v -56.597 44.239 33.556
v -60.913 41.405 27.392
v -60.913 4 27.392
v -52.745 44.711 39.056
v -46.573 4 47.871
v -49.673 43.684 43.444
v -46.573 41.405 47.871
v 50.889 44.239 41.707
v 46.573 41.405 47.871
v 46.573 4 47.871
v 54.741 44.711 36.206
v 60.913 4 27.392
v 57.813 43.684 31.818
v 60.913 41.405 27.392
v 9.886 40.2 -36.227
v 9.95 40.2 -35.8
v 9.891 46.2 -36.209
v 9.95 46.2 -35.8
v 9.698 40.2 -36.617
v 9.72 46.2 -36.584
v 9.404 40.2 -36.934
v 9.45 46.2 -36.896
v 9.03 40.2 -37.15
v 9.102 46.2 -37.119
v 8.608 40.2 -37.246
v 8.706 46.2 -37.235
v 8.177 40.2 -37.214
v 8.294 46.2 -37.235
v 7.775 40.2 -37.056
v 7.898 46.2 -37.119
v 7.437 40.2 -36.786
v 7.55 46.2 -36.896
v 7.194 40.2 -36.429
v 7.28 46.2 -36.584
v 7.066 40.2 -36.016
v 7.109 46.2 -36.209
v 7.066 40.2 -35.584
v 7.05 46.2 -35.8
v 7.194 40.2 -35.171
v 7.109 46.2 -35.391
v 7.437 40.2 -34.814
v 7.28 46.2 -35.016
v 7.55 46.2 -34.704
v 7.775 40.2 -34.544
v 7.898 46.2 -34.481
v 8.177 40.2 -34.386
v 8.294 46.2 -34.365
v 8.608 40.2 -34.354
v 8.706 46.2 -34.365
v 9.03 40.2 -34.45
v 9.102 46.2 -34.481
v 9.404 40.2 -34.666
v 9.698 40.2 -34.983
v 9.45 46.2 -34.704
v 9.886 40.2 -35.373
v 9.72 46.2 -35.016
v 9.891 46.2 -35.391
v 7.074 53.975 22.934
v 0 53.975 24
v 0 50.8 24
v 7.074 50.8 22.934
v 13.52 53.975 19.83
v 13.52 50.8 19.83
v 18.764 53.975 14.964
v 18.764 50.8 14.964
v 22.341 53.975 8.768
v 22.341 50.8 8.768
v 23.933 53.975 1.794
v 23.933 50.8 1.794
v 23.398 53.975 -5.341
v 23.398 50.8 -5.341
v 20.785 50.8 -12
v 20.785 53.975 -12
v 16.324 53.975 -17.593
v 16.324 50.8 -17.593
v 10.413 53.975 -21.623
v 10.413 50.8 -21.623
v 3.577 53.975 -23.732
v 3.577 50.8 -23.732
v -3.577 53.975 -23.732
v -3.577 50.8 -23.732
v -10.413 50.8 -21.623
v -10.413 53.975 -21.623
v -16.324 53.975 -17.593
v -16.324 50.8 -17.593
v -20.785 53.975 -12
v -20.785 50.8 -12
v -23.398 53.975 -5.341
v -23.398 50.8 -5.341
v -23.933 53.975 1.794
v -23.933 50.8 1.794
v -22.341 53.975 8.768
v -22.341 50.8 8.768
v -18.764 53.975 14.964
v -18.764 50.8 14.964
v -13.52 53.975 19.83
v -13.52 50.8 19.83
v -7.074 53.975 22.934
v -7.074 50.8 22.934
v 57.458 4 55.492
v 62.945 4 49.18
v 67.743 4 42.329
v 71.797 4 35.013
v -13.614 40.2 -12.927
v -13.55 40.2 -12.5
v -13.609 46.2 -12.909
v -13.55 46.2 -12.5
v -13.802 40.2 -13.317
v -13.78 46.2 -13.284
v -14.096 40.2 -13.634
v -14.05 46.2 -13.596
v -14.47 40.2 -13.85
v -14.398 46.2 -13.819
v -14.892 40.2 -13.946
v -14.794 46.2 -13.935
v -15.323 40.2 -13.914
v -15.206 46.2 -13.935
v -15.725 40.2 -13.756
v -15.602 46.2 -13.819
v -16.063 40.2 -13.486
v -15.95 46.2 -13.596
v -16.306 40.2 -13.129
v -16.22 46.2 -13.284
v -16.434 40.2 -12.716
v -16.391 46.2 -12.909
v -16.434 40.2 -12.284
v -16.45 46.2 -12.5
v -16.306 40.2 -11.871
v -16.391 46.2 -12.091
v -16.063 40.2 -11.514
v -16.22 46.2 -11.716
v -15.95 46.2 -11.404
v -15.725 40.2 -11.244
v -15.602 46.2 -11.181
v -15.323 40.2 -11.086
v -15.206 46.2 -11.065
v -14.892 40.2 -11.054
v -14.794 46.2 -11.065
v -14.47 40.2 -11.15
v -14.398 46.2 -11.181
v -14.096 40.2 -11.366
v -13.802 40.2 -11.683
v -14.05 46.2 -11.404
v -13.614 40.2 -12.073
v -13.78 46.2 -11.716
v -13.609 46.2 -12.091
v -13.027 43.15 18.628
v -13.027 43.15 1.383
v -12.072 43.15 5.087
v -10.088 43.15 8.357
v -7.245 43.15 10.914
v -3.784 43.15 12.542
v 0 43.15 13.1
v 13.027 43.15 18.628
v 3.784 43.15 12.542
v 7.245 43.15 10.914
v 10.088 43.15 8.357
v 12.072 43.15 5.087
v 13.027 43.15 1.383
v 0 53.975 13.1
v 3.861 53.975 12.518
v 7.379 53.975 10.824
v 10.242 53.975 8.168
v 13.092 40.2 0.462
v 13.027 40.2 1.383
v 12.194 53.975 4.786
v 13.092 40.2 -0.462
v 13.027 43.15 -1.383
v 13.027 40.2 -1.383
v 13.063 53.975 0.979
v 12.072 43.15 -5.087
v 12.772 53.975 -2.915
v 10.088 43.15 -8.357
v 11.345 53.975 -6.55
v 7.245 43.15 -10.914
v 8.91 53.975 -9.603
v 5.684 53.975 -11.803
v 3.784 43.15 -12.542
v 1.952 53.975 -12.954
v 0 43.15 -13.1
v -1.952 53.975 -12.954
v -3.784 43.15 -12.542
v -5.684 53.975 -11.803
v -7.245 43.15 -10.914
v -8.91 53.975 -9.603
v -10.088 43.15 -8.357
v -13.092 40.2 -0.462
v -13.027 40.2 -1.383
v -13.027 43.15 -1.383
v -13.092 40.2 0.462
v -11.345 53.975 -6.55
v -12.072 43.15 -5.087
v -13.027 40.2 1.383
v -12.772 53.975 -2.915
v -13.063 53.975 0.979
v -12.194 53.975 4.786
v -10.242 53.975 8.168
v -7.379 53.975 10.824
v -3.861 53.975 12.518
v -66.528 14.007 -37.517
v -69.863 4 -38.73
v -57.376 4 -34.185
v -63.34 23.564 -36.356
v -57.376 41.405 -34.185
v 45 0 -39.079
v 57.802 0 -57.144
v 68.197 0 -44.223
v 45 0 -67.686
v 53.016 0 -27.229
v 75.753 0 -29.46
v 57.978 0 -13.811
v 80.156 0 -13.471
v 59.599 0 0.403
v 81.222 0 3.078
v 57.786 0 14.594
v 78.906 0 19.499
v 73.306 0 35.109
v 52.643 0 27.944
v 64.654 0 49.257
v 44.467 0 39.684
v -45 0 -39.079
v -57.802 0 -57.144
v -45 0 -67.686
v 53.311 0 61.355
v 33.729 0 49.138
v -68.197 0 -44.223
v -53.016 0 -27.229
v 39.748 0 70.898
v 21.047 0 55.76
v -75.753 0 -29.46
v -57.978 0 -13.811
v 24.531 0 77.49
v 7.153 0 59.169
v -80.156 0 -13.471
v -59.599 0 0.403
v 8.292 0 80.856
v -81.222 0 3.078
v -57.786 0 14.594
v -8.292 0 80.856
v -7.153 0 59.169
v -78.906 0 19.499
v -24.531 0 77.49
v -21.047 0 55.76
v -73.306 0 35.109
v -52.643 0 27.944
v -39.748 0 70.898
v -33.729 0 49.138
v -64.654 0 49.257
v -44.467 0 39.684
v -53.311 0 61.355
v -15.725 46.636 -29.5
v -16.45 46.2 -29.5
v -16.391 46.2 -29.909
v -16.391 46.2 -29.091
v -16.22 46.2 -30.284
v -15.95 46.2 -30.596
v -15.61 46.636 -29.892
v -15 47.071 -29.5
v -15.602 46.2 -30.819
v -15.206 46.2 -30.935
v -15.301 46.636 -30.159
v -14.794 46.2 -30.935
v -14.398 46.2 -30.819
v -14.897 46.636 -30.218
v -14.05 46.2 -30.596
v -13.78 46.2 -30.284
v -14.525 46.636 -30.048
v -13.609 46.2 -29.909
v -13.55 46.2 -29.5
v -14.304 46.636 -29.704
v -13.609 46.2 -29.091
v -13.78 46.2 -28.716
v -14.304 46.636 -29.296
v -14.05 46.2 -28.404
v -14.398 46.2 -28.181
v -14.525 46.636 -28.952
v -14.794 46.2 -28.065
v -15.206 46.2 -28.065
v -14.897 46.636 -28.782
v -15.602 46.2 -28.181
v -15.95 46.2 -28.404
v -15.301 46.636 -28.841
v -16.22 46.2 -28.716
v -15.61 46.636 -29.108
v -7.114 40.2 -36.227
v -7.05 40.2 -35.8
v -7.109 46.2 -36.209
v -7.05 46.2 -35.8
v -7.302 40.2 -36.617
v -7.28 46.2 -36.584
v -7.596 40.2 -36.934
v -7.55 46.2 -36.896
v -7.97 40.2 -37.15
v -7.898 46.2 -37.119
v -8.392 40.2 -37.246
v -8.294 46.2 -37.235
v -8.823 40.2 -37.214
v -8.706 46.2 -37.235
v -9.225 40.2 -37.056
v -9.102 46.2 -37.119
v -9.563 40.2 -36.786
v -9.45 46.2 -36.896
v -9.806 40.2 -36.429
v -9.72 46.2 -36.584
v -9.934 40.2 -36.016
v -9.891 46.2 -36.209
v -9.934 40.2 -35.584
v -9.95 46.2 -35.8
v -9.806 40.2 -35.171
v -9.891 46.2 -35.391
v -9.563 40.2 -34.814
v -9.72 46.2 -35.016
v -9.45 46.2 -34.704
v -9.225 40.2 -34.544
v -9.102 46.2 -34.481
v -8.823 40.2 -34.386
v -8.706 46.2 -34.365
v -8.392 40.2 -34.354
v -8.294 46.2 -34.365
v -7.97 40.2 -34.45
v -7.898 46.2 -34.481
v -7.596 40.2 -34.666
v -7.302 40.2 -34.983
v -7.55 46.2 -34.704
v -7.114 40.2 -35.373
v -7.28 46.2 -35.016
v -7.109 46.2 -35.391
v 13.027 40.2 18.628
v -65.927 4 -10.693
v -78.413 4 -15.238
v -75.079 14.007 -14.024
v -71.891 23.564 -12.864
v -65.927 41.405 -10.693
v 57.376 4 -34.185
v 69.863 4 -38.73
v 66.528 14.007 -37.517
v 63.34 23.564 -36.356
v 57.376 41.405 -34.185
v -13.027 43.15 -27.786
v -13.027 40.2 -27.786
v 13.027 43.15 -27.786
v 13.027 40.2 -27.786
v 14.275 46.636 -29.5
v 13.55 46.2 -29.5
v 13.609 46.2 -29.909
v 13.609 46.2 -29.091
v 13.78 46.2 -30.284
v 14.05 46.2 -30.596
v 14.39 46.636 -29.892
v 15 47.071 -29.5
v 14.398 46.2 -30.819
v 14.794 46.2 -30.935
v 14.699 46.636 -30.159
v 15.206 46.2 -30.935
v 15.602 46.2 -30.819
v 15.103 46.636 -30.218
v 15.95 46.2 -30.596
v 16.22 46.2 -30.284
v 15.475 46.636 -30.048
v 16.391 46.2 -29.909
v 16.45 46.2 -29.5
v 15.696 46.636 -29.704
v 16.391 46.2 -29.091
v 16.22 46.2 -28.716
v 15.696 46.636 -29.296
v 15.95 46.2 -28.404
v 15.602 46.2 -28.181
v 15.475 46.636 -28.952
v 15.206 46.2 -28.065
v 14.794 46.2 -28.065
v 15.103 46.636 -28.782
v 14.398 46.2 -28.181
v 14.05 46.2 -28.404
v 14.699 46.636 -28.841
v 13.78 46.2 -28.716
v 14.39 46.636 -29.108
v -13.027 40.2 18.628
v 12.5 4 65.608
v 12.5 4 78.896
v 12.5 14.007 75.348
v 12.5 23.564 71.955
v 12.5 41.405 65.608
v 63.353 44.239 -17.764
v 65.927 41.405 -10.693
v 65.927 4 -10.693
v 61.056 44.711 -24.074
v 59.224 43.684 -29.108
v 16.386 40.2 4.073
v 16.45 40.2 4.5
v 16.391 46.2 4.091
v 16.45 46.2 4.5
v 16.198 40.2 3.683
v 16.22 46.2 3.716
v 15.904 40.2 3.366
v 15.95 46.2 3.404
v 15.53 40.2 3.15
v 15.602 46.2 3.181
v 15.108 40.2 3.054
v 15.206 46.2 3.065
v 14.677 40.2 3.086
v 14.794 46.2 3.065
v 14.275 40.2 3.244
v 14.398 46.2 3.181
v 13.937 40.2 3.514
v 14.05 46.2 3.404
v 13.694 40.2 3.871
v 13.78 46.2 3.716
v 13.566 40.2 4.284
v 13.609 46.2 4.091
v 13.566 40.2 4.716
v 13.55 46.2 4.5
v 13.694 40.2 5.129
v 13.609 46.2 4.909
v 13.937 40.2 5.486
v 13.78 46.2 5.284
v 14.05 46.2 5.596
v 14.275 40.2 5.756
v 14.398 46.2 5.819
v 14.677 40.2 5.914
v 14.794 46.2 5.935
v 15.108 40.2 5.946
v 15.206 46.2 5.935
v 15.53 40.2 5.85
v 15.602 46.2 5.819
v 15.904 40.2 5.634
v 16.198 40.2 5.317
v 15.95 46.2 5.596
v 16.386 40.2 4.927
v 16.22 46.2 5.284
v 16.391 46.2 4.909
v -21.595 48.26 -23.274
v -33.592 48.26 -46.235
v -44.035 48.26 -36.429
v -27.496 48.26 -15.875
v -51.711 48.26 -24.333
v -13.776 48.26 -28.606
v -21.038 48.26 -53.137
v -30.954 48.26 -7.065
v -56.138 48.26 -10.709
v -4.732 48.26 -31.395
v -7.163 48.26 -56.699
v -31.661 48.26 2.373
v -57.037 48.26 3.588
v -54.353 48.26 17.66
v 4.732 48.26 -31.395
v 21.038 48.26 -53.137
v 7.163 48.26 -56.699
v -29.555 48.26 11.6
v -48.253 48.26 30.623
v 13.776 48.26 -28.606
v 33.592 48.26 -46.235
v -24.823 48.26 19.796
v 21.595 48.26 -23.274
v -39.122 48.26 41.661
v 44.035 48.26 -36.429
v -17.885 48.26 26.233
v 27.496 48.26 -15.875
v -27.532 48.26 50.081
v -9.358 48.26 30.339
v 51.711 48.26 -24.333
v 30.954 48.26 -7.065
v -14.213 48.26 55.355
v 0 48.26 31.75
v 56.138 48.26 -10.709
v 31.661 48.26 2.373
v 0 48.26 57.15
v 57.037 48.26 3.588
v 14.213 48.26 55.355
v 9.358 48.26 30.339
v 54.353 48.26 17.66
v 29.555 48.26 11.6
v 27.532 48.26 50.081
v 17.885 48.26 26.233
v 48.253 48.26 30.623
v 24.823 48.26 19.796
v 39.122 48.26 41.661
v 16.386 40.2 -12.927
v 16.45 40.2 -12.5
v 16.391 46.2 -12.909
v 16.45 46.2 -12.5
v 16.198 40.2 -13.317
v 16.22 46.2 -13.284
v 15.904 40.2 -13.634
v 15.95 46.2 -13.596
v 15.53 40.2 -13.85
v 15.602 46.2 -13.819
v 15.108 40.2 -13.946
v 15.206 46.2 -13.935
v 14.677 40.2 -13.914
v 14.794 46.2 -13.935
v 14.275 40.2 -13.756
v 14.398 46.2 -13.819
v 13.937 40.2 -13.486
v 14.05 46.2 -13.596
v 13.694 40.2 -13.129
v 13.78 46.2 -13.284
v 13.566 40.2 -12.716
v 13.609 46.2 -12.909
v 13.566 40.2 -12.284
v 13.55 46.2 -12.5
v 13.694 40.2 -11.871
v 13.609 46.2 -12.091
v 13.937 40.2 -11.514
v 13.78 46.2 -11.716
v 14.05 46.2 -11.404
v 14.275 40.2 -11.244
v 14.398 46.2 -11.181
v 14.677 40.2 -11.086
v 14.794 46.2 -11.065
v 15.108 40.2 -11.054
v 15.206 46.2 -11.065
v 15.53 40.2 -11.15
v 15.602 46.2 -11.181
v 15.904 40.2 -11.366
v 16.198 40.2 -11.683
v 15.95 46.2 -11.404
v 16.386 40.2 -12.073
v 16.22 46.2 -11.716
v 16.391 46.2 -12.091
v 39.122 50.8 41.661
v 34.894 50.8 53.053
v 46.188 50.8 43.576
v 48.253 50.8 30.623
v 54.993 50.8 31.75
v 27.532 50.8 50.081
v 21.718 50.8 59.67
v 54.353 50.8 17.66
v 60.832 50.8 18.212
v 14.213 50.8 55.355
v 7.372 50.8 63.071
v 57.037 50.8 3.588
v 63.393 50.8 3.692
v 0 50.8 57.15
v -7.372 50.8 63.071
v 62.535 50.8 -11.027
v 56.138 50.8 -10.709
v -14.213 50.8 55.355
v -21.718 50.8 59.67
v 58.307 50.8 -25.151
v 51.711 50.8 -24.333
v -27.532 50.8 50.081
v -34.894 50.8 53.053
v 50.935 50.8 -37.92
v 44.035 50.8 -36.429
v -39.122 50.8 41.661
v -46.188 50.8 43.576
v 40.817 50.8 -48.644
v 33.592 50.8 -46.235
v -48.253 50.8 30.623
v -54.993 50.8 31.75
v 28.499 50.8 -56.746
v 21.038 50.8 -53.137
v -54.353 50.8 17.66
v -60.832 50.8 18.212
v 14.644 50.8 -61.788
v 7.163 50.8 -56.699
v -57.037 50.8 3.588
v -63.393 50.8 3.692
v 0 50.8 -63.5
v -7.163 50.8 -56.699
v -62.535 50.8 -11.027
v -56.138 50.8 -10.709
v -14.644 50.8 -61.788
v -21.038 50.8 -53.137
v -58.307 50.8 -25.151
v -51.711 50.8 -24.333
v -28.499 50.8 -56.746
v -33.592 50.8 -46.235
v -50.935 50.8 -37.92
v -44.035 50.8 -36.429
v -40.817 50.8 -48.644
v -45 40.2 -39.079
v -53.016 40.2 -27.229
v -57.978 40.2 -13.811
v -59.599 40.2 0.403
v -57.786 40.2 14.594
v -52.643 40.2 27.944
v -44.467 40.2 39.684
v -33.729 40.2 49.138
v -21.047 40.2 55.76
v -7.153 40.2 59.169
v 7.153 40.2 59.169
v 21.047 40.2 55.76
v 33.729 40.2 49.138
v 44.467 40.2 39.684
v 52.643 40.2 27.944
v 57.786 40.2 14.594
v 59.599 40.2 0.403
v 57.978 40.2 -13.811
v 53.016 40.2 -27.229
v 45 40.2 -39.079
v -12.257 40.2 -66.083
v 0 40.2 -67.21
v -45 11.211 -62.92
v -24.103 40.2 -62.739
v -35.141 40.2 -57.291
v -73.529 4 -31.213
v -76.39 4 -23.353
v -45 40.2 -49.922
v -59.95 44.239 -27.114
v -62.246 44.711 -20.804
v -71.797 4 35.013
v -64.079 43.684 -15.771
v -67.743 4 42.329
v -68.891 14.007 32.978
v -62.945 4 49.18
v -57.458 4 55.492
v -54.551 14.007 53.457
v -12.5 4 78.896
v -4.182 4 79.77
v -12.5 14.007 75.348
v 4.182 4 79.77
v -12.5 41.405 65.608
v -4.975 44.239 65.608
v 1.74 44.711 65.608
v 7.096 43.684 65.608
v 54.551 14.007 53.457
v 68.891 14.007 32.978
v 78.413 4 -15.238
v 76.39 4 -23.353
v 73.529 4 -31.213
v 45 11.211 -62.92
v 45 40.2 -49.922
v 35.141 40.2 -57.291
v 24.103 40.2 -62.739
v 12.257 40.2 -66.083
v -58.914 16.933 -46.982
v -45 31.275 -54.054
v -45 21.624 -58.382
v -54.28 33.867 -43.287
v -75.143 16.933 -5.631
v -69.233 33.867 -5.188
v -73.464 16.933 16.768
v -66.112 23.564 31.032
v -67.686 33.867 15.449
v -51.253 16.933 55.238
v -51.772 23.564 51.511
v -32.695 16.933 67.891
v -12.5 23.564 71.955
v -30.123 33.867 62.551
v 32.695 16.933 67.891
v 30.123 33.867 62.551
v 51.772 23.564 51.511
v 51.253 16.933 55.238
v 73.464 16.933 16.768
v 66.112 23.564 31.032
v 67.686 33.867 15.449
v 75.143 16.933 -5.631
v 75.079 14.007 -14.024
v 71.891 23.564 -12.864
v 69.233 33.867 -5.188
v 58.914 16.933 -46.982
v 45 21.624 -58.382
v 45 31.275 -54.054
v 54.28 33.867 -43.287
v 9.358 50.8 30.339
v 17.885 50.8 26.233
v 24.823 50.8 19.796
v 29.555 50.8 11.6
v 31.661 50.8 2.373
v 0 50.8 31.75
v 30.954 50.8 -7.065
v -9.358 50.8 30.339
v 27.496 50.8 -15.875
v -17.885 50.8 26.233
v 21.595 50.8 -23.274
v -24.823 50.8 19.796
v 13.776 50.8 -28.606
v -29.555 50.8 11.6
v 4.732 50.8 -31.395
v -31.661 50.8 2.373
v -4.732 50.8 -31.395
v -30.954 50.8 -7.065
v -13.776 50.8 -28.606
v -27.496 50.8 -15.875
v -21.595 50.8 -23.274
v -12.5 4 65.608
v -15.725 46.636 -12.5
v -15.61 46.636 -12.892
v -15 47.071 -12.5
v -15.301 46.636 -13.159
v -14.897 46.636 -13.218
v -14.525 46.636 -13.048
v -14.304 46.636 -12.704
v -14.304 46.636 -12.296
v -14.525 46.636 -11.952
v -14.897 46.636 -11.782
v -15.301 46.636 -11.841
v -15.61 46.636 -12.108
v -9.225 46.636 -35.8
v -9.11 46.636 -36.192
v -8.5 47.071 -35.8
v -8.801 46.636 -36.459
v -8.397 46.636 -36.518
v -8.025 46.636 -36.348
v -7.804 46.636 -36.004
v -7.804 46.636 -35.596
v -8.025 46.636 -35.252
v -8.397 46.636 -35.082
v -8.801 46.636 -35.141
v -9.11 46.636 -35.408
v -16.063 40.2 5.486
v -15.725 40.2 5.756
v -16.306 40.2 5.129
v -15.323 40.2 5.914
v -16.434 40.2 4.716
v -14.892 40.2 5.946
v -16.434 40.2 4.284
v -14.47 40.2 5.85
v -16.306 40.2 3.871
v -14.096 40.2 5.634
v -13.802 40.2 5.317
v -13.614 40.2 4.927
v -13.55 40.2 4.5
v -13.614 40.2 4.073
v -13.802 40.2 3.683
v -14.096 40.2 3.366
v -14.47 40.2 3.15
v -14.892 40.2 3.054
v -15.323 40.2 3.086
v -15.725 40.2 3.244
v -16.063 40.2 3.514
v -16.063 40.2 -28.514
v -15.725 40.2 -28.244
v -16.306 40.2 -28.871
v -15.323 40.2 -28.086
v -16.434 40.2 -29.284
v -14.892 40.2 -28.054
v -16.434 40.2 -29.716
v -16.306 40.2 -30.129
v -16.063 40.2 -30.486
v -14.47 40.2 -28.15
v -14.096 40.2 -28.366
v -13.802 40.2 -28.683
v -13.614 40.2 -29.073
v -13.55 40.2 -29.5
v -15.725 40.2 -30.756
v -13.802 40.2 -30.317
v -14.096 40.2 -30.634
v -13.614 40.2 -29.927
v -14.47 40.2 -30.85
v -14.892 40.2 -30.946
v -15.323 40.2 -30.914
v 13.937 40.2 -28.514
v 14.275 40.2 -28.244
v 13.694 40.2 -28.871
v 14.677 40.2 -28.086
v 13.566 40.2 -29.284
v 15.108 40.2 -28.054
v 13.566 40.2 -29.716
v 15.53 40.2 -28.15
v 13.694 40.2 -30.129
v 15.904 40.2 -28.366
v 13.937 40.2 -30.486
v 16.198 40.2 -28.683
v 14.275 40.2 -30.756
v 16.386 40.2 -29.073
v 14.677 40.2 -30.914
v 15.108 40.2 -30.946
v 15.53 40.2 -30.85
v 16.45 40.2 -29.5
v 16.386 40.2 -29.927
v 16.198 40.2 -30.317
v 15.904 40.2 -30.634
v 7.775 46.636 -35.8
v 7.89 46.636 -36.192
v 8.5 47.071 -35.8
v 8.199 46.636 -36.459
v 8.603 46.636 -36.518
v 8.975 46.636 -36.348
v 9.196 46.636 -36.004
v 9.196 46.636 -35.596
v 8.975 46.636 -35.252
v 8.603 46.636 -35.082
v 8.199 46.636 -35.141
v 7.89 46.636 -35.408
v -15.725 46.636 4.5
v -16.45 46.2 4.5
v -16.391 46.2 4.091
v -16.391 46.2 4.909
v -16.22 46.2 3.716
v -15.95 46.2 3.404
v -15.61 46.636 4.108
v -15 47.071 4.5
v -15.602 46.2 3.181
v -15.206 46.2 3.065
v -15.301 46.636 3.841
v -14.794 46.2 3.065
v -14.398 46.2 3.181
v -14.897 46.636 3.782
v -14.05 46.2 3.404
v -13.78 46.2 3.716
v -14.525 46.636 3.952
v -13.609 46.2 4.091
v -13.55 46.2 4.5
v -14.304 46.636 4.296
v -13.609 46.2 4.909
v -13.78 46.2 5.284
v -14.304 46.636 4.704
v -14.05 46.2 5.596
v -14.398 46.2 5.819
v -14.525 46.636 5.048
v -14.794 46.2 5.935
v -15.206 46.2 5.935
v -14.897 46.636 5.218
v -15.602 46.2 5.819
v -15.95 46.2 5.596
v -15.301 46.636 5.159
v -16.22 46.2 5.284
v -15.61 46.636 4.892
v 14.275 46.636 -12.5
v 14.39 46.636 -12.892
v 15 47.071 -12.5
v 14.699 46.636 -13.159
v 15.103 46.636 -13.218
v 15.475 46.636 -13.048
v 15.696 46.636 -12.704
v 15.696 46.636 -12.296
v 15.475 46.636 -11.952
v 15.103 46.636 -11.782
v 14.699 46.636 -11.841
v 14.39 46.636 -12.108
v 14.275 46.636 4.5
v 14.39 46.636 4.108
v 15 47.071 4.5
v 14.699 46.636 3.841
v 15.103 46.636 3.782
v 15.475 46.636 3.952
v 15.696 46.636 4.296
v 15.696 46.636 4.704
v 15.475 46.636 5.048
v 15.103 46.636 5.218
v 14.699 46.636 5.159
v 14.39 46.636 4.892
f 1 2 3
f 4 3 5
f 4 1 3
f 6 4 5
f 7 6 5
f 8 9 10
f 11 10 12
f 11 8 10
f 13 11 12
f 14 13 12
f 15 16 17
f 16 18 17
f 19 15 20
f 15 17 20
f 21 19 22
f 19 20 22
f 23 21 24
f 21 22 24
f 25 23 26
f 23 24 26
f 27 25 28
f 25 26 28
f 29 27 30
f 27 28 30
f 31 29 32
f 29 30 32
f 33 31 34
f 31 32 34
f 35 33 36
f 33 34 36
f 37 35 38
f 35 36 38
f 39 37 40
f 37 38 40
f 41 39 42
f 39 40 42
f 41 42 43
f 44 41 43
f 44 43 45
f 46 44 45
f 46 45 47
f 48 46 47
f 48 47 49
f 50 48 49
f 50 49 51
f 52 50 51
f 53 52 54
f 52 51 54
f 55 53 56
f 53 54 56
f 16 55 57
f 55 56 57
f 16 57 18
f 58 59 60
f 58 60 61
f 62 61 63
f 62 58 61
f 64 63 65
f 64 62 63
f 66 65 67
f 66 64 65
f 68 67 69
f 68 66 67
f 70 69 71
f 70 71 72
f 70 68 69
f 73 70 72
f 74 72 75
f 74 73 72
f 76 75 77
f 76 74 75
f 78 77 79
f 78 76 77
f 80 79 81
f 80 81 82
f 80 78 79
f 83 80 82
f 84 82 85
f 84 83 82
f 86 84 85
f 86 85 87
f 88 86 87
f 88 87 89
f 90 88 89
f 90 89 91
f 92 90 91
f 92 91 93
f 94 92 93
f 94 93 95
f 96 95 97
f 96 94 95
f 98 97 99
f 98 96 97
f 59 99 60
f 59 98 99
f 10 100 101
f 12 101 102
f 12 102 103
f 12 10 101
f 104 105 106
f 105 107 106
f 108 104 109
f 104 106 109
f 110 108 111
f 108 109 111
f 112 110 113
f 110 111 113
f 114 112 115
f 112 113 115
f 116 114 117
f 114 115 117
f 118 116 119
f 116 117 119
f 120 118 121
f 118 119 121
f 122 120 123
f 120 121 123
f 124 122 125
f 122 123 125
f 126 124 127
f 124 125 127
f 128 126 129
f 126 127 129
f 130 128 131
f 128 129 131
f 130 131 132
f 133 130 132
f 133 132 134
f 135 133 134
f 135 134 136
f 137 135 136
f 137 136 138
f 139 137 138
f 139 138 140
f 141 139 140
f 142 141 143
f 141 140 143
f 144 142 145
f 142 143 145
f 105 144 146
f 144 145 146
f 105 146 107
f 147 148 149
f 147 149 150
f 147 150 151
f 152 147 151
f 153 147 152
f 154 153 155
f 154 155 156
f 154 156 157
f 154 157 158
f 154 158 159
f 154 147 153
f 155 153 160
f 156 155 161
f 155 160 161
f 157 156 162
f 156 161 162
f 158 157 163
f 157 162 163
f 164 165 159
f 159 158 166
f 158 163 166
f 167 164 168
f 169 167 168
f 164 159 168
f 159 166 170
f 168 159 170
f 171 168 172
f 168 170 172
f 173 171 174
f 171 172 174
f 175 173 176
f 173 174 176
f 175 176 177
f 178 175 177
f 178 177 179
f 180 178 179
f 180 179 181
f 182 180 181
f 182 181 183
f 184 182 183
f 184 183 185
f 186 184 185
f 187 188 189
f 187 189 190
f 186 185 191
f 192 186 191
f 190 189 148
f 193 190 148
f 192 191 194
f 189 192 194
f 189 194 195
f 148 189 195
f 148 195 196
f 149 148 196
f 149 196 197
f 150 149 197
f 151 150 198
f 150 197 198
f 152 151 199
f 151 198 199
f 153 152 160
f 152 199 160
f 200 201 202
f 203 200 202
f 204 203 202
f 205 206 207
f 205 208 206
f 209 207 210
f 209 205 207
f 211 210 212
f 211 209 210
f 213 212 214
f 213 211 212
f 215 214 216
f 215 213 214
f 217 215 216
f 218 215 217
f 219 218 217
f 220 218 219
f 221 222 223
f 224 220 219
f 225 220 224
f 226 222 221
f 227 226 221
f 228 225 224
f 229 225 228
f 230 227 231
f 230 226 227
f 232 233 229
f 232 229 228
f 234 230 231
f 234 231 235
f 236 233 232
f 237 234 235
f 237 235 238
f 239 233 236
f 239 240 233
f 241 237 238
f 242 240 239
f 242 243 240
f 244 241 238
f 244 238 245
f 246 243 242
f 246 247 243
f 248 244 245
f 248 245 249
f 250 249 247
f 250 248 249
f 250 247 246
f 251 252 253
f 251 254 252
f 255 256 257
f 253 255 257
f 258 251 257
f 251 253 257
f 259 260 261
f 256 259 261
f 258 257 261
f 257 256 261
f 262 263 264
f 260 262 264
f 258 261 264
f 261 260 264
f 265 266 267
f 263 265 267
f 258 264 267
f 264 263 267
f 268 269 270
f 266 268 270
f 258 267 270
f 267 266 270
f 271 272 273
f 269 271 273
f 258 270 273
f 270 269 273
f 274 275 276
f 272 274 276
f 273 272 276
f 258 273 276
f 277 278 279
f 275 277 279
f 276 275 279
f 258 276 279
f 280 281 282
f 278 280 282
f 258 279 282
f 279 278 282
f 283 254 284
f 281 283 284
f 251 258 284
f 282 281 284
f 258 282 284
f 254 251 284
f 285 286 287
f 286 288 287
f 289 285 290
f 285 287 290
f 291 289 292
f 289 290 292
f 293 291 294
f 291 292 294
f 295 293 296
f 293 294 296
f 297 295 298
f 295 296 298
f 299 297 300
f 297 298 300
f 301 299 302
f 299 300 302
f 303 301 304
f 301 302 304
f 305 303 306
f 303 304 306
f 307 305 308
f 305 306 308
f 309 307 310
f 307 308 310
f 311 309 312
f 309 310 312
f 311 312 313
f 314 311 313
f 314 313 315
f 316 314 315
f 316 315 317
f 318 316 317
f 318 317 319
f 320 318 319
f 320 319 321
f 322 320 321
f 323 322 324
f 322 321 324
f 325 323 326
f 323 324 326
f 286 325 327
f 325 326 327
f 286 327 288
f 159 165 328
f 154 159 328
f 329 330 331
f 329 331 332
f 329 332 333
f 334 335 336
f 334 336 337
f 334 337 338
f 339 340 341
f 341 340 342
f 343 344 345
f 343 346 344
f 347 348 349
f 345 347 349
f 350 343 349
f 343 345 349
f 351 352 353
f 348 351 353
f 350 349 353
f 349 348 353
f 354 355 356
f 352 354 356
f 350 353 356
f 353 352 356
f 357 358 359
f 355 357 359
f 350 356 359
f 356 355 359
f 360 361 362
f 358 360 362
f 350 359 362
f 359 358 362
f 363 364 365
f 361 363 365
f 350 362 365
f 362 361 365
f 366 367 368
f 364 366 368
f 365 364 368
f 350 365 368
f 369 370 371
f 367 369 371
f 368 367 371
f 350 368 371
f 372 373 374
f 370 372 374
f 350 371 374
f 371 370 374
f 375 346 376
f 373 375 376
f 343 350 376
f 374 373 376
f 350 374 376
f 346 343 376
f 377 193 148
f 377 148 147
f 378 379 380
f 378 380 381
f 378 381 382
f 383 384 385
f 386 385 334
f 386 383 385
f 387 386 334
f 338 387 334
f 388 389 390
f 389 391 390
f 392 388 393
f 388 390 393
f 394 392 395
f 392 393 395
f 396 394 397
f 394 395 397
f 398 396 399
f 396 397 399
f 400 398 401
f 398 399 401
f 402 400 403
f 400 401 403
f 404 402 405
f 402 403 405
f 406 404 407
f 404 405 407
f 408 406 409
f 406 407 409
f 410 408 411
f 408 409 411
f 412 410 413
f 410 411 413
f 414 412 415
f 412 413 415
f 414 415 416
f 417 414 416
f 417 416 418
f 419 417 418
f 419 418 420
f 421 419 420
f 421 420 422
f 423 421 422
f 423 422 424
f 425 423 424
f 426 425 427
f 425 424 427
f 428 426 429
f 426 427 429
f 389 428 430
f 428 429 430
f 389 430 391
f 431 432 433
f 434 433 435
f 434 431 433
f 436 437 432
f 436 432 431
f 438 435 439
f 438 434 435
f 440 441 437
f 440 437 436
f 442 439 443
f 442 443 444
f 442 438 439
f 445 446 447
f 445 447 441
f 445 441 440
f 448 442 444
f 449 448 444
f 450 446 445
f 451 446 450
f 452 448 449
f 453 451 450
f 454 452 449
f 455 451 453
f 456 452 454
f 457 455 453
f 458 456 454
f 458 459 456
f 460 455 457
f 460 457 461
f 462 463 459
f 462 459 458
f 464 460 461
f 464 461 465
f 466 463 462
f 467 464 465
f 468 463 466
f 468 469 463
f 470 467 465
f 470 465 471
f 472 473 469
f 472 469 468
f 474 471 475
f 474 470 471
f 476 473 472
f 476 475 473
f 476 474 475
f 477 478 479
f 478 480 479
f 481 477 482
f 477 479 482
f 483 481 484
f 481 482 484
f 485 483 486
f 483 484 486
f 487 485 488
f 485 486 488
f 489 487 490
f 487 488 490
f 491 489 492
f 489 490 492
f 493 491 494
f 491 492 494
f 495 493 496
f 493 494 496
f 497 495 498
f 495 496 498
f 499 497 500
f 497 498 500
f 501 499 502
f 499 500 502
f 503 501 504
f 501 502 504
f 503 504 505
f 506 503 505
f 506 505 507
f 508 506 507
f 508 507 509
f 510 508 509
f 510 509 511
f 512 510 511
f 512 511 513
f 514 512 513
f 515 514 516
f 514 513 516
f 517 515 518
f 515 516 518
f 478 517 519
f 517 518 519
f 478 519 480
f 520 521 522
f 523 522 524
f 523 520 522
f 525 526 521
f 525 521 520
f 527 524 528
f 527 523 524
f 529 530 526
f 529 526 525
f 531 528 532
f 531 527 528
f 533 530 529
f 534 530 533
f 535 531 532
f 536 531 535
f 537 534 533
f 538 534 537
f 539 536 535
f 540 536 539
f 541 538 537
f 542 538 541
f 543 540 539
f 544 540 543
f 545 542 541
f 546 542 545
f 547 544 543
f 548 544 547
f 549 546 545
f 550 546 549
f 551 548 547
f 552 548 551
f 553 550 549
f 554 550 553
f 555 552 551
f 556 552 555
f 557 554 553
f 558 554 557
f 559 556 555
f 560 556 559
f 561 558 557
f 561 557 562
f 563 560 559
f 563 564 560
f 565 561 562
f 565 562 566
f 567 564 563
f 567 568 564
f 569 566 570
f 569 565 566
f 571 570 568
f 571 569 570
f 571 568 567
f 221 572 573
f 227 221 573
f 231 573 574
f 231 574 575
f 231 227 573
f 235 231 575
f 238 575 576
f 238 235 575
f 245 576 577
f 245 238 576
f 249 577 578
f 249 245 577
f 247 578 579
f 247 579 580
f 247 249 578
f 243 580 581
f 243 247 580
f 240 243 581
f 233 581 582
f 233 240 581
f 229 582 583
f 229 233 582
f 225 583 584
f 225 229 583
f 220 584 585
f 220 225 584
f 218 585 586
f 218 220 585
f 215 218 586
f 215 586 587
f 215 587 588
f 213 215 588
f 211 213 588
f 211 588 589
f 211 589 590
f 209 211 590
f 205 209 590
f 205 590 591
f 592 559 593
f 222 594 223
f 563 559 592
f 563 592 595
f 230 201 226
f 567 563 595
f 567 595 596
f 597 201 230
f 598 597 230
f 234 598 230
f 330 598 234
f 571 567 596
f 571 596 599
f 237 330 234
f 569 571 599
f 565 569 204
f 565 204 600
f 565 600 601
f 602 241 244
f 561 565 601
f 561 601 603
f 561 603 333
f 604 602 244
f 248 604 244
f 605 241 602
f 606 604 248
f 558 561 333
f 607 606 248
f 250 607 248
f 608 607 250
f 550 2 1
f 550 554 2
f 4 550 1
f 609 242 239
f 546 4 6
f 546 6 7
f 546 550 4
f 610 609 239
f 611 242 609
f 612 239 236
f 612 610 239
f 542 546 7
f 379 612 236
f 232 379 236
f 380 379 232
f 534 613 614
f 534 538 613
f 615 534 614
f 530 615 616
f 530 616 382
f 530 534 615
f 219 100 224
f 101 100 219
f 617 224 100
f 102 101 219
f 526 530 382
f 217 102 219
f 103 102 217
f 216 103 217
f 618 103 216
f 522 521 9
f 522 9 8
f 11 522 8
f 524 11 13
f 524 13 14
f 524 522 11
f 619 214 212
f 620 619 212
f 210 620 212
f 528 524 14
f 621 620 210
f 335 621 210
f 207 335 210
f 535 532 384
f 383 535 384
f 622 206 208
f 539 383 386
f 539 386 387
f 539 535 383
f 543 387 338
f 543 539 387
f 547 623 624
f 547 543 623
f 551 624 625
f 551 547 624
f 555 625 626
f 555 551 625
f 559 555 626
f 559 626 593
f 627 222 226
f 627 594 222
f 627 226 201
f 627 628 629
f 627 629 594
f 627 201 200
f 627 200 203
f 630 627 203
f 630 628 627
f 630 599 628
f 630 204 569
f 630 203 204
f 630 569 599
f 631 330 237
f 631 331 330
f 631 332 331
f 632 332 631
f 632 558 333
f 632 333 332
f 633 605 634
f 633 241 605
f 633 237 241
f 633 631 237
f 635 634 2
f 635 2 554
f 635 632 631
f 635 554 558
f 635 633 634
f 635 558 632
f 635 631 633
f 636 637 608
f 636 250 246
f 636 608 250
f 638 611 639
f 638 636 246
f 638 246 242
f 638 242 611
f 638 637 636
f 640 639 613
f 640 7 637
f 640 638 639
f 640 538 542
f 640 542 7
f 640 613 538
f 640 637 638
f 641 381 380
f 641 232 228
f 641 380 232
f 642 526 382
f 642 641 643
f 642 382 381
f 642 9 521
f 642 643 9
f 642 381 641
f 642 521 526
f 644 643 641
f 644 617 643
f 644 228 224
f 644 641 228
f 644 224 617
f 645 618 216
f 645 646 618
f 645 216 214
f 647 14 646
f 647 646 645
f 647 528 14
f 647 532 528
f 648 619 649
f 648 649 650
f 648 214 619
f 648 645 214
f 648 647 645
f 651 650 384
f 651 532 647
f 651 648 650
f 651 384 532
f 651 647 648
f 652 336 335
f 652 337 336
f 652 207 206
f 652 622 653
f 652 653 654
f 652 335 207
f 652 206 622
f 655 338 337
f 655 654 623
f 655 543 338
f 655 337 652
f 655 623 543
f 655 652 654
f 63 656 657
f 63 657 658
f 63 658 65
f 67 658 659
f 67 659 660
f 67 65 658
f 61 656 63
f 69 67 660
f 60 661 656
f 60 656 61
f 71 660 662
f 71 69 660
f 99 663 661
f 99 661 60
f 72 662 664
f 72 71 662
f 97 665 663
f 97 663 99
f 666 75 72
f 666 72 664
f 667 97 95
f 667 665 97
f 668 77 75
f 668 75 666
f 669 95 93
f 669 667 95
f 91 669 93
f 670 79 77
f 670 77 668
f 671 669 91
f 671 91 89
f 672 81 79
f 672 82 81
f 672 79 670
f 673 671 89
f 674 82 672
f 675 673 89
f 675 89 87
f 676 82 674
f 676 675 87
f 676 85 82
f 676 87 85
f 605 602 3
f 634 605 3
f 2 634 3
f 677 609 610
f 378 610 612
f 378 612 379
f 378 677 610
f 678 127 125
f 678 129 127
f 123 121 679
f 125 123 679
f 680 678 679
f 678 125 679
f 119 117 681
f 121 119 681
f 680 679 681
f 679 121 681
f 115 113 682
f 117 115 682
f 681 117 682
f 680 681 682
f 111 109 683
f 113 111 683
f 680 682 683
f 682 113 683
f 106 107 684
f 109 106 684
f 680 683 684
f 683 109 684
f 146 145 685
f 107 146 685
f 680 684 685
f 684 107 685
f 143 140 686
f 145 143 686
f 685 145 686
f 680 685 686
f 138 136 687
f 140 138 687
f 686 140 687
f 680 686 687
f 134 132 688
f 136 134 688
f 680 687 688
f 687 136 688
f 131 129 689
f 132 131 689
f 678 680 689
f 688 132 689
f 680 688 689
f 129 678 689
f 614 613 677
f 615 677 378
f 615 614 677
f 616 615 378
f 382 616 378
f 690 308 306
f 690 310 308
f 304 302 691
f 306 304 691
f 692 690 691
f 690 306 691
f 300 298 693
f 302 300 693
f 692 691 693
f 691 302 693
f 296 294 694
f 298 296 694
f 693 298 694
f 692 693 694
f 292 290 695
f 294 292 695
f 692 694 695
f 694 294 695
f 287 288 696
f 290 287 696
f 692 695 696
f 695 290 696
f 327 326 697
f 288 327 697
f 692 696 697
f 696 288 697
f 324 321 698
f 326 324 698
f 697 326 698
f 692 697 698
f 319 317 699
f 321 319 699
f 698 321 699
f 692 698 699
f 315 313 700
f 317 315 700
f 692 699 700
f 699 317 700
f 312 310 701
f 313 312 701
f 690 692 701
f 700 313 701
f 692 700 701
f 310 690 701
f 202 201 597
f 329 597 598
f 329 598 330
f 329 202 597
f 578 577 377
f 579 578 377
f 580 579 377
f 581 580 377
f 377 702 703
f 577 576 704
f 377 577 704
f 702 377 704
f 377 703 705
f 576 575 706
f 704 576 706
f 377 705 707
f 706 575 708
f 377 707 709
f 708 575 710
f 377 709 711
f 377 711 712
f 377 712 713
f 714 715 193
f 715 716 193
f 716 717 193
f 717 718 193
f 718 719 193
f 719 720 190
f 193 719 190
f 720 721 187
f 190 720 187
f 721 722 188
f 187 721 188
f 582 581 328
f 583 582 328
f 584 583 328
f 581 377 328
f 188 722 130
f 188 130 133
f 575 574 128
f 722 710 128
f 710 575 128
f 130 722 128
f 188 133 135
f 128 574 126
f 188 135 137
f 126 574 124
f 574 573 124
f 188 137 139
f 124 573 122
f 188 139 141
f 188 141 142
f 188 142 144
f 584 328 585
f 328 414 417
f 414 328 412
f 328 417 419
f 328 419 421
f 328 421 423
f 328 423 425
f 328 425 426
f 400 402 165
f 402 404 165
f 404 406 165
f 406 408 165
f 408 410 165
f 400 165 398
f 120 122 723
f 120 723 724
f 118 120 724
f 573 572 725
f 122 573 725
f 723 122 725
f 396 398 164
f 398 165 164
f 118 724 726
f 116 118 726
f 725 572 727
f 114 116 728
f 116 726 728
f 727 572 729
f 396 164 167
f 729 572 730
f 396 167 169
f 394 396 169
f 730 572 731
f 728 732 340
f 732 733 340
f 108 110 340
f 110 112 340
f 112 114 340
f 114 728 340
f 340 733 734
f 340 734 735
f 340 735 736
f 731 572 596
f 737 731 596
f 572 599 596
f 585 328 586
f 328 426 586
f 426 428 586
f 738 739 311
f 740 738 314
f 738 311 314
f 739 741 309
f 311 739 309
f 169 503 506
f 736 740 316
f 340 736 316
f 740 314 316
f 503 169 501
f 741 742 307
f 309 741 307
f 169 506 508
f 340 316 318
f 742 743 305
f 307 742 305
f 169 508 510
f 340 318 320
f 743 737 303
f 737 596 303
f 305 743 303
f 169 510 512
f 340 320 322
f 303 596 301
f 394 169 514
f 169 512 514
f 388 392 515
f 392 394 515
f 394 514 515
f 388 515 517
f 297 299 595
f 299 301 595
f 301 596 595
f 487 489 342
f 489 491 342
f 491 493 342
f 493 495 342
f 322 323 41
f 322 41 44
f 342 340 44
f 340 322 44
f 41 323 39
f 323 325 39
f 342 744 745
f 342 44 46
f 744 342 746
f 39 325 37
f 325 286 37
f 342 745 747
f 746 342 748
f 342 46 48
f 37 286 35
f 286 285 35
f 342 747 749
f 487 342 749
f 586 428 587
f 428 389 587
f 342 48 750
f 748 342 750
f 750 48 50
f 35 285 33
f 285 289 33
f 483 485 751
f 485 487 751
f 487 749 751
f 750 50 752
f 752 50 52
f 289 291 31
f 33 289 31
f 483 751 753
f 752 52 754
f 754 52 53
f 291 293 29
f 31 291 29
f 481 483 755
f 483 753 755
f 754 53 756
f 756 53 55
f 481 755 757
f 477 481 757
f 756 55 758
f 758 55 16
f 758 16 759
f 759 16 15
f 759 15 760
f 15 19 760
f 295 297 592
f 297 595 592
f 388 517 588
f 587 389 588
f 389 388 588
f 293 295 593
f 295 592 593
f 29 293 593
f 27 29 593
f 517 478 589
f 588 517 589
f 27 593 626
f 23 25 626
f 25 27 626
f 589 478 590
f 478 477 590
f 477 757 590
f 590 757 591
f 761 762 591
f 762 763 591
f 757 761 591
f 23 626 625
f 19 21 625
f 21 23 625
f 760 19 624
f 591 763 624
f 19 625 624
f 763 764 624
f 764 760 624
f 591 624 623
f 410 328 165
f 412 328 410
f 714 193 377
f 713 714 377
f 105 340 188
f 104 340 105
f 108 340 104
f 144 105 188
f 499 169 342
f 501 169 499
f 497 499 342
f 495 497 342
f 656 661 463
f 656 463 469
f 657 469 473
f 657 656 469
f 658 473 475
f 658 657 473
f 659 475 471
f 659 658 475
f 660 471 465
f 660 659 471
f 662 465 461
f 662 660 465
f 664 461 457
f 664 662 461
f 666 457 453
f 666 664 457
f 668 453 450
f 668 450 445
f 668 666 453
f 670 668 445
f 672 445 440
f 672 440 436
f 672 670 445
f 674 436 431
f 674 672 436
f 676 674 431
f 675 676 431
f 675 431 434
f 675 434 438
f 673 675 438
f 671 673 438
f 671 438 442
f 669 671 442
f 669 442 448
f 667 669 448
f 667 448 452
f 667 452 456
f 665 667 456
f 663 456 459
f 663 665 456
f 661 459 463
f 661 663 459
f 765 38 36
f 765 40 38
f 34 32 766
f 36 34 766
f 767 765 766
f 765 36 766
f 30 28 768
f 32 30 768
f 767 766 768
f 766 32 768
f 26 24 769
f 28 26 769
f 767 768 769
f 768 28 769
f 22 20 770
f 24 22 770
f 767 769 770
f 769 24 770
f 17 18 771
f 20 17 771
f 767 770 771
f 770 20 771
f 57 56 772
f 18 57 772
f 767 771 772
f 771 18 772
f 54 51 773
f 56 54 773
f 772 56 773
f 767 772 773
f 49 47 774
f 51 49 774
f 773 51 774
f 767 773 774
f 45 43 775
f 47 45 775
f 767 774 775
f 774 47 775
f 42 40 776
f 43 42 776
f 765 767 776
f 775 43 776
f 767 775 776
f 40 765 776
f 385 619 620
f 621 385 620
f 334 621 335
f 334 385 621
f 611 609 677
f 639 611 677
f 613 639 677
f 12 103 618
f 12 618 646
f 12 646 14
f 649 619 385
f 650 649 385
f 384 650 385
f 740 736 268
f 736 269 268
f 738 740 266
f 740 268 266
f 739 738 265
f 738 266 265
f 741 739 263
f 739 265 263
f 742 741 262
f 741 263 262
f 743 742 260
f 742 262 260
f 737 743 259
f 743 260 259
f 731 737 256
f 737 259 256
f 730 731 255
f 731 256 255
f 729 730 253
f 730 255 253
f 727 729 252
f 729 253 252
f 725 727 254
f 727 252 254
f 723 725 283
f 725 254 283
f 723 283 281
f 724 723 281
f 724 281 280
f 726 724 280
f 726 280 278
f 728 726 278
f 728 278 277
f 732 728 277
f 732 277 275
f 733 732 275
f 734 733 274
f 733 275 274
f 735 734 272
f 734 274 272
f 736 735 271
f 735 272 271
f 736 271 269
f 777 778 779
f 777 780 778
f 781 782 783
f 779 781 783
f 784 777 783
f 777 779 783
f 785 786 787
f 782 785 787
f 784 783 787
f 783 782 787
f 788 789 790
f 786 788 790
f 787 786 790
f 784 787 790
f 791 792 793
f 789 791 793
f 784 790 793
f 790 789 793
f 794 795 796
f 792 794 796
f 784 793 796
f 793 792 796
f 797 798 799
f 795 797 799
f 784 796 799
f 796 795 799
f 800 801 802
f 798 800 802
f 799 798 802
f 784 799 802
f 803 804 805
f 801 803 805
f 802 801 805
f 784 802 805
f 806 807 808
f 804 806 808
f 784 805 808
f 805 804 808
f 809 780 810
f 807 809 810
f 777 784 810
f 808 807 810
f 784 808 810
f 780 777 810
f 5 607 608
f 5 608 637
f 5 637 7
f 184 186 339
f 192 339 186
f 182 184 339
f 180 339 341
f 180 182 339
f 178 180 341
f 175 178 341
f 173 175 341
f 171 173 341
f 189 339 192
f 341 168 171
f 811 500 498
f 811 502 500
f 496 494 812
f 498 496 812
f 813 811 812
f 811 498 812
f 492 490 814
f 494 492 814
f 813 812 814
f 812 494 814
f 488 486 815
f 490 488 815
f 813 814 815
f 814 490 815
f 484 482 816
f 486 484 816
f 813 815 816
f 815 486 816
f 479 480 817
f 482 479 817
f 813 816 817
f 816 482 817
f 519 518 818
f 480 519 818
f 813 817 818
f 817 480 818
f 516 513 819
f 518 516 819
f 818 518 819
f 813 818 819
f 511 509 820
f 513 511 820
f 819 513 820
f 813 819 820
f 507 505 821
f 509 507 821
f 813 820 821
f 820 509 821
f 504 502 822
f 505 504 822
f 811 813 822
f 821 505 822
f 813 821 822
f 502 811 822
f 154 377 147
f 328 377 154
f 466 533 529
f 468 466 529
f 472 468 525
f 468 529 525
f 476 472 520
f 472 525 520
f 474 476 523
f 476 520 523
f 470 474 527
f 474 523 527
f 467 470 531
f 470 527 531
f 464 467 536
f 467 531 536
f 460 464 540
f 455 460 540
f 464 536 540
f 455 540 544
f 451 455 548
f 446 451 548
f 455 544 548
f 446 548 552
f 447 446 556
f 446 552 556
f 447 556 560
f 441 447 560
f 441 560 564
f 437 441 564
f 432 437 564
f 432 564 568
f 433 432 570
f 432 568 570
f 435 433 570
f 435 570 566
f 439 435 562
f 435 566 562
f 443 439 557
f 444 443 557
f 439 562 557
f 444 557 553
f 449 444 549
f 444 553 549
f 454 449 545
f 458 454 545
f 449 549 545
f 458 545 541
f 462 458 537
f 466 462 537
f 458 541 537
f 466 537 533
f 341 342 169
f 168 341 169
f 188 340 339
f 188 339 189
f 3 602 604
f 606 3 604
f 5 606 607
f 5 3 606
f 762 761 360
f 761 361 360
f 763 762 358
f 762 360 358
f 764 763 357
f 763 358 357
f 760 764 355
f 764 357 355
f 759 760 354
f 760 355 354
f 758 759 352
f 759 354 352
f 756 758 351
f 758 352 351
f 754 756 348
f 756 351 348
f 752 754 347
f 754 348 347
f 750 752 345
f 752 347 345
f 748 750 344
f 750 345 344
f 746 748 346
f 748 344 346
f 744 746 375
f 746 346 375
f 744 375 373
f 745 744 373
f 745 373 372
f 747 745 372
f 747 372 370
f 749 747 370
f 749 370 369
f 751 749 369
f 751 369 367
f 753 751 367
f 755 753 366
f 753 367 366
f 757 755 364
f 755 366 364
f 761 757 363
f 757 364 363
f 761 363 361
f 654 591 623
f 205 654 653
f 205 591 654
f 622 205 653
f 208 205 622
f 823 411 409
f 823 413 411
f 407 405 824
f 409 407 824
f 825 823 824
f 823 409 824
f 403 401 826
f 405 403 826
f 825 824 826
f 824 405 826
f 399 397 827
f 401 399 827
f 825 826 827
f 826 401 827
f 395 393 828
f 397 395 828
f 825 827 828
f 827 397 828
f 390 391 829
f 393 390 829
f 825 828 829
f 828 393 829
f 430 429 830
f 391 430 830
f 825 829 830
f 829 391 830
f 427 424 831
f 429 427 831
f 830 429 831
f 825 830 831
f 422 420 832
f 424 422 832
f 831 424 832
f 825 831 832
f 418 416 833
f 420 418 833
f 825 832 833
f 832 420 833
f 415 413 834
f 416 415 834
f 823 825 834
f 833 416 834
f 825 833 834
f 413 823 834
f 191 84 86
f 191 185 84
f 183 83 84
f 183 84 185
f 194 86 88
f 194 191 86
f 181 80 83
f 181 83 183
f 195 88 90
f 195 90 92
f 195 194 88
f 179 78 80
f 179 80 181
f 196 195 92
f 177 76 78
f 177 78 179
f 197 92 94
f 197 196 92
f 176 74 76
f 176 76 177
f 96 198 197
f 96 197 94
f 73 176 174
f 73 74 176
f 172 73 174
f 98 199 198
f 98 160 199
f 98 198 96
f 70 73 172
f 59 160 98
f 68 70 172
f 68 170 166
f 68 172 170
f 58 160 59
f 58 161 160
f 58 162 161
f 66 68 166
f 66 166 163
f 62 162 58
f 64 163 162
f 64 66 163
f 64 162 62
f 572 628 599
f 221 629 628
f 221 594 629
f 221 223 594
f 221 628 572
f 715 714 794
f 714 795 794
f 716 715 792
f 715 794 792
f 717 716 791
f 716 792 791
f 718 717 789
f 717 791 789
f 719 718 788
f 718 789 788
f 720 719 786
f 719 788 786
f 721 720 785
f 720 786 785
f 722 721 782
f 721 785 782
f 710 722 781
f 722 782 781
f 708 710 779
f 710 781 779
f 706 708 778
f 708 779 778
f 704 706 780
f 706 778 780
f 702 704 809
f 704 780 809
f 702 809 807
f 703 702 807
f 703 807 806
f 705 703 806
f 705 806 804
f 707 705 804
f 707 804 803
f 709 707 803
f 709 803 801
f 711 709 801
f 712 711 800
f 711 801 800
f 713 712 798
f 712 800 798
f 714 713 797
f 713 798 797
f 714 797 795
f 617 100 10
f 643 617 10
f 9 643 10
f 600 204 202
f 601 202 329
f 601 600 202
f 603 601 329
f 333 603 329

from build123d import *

# Parameters (mm, degrees)
CUT_EXTRUDE1_DEPTH         = 40.2
SKETCH5_R                  = 13.1
CUT_EXTRUDE2_DEPTH         = 10.6
BOSS_EXTRUDE1_START        = 3.175
SKETCH5_3_R                = 24
SKETCH5_3_R_2              = 13.1
BOSS_EXTRUDE1_DEPTH        = 3.175
SKETCH6_W                  = 25
SKETCH6_H                  = 28.783830664
CUT_EXTRUDE3_DEPTH         = 46.8
CIRPATTERN1_COUNT          = 3
CIRPATTERN1_ANGLE          = 110
CIRPATTERN2_COUNT          = 3
CIRPATTERN2_ANGLE          = 110
SKETCH7_W                  = 26.05355805
SKETCH7_H                  = 46.414815382
CUT_EXTRUDE4_DEPTH         = 2.95
M2_5_CLEARANCE_HOLE1_D     = 2.9
M2_5_CLEARANCE_HOLE1_DEPTH = 6
M2_5_CLEARANCE_HOLE1_TIP   = 0.871247898
SKETCH11_R                 = 57.15
SKETCH11_R_2               = 31.75
CUT_EXTRUDE5_DEPTH         = 2.54


with BuildPart() as part:
    # Sketch3 → Revolve1 (revolve)
    with BuildSketch(Plane.XY, mode=Mode.PRIVATE) as revolve1_sk:
        Polygon((60.96, 0), (81.28, 0), (63.5, 50.8), (0, 50.8), (0, 0), align=None)
    revolve(revolve1_sk.sketch.rotate(Axis((0, 0, 0), (0, 1, 0)), 90), axis=Axis((0, 0, 0), (0, 1, 0)))

    # Sketch4 → Cut-Extrude1 (cut)
    with BuildSketch(Plane(origin=(0, 0, 0), x_dir=(-1, 0, 0), z_dir=(0, -1, 0))):
        with BuildLine():
            Line((-44.999992712, 39.078902952), (-44.999992712, 81.540670454))
            Line((-44.999992712, 81.540670454), (44.999992712, 81.540670454))
            Line((44.999992712, 81.540670454), (44.999992712, 39.078902952))
            ThreePointArc((44.999992712, 39.078902952), (0, -59.6), (-44.999992712, 39.078902952))
        make_face()
    extrude(amount=-CUT_EXTRUDE1_DEPTH, mode=Mode.SUBTRACT)

    # Sketch5 → Cut-Extrude2 (cut)
    with BuildSketch(Plane(origin=(0, 50.8, 0), x_dir=(1, 0, 0), z_dir=(0, 1, 0))):
        with Locations(Location((0, 0, 0), (0, 0, 270))):
            Circle(SKETCH5_R)
    extrude(amount=-CUT_EXTRUDE2_DEPTH, mode=Mode.SUBTRACT)

    # Sketch5<3> → Boss-Extrude1 (add)
    with BuildSketch(Plane(origin=(0, 50.8, 0), x_dir=(1, 0, 0), z_dir=(0, 1, 0)).offset(BOSS_EXTRUDE1_START)):
        with Locations(Location((0, 0, 0), (0, 0, 270))):
            Circle(SKETCH5_3_R)
        with Locations(Location((0, 0, 0), (0, 0, 270))):
            Circle(SKETCH5_3_R_2, mode=Mode.SUBTRACT)
    extrude(amount=-BOSS_EXTRUDE1_DEPTH)

    # Sketch6 → Cut-Extrude3 (cut)
    with BuildSketch(Plane(origin=(0, 50.8, 0), x_dir=(1, 0, 0), z_dir=(0, 1, 0))):
        with Locations((0, -80)):
            Rectangle(SKETCH6_W, SKETCH6_H)
    cut_extrude3 = extrude(amount=-CUT_EXTRUDE3_DEPTH, mode=Mode.SUBTRACT)

    # CirPattern1: Cut-Extrude3 ×3 about axis
    cirpattern1_axis = Axis((0, 0, 0), (0, -1, 0))
    for i in range(1, CIRPATTERN1_COUNT):
        add(cut_extrude3.rotate(cirpattern1_axis, i * CIRPATTERN1_ANGLE / (CIRPATTERN1_COUNT - 1)), mode=Mode.SUBTRACT)

    # CirPattern2: Cut-Extrude3 ×3 about axis
    cirpattern2_axis = Axis((0, 0, 0), (0, 1, 0))
    for i in range(1, CIRPATTERN2_COUNT):
        add(cut_extrude3.rotate(cirpattern2_axis, i * CIRPATTERN2_ANGLE / (CIRPATTERN2_COUNT - 1)), mode=Mode.SUBTRACT)

    # Sketch7 → Cut-Extrude4 (cut)
    with BuildSketch(Plane.XZ.offset(-40.2)):
        with Locations((0, -4.57891024)):
            Rectangle(SKETCH7_W, SKETCH7_H)
    extrude(amount=-CUT_EXTRUDE4_DEPTH, mode=Mode.SUBTRACT)

    # M2.5 Clearance Hole1
    with Locations(Plane(origin=(0, 40.2, 0), x_dir=(-1, 0, 0), z_dir=(0, -1, 0))):
        with Locations((-15, -4.5), (15, -4.5), (15, 12.5), (-15, 12.5), (15, 29.5), (-15, 29.5), (-8.5, 35.8), (8.5, 35.8)):
            Hole(M2_5_CLEARANCE_HOLE1_D / 2, depth=M2_5_CLEARANCE_HOLE1_DEPTH)
            with Locations((0, 0, -(M2_5_CLEARANCE_HOLE1_DEPTH + M2_5_CLEARANCE_HOLE1_TIP / 2))):  # 118° drill point
                Cone(0, M2_5_CLEARANCE_HOLE1_D / 2, M2_5_CLEARANCE_HOLE1_TIP, mode=Mode.SUBTRACT)

    # Sketch11 → Cut-Extrude5 (cut)
    with BuildSketch(Plane(origin=(0, 50.8, 0), x_dir=(1, 0, 0), z_dir=(0, 1, 0))):
        with Locations(Location((0, 0, 0), (0, 0, 270))):
            Circle(SKETCH11_R)
        with Locations(Location((0, 0, 0), (0, 0, 270))):
            Circle(SKETCH11_R_2, mode=Mode.SUBTRACT)
    extrude(amount=-CUT_EXTRUDE5_DEPTH, mode=Mode.SUBTRACT)


solid = part.part
